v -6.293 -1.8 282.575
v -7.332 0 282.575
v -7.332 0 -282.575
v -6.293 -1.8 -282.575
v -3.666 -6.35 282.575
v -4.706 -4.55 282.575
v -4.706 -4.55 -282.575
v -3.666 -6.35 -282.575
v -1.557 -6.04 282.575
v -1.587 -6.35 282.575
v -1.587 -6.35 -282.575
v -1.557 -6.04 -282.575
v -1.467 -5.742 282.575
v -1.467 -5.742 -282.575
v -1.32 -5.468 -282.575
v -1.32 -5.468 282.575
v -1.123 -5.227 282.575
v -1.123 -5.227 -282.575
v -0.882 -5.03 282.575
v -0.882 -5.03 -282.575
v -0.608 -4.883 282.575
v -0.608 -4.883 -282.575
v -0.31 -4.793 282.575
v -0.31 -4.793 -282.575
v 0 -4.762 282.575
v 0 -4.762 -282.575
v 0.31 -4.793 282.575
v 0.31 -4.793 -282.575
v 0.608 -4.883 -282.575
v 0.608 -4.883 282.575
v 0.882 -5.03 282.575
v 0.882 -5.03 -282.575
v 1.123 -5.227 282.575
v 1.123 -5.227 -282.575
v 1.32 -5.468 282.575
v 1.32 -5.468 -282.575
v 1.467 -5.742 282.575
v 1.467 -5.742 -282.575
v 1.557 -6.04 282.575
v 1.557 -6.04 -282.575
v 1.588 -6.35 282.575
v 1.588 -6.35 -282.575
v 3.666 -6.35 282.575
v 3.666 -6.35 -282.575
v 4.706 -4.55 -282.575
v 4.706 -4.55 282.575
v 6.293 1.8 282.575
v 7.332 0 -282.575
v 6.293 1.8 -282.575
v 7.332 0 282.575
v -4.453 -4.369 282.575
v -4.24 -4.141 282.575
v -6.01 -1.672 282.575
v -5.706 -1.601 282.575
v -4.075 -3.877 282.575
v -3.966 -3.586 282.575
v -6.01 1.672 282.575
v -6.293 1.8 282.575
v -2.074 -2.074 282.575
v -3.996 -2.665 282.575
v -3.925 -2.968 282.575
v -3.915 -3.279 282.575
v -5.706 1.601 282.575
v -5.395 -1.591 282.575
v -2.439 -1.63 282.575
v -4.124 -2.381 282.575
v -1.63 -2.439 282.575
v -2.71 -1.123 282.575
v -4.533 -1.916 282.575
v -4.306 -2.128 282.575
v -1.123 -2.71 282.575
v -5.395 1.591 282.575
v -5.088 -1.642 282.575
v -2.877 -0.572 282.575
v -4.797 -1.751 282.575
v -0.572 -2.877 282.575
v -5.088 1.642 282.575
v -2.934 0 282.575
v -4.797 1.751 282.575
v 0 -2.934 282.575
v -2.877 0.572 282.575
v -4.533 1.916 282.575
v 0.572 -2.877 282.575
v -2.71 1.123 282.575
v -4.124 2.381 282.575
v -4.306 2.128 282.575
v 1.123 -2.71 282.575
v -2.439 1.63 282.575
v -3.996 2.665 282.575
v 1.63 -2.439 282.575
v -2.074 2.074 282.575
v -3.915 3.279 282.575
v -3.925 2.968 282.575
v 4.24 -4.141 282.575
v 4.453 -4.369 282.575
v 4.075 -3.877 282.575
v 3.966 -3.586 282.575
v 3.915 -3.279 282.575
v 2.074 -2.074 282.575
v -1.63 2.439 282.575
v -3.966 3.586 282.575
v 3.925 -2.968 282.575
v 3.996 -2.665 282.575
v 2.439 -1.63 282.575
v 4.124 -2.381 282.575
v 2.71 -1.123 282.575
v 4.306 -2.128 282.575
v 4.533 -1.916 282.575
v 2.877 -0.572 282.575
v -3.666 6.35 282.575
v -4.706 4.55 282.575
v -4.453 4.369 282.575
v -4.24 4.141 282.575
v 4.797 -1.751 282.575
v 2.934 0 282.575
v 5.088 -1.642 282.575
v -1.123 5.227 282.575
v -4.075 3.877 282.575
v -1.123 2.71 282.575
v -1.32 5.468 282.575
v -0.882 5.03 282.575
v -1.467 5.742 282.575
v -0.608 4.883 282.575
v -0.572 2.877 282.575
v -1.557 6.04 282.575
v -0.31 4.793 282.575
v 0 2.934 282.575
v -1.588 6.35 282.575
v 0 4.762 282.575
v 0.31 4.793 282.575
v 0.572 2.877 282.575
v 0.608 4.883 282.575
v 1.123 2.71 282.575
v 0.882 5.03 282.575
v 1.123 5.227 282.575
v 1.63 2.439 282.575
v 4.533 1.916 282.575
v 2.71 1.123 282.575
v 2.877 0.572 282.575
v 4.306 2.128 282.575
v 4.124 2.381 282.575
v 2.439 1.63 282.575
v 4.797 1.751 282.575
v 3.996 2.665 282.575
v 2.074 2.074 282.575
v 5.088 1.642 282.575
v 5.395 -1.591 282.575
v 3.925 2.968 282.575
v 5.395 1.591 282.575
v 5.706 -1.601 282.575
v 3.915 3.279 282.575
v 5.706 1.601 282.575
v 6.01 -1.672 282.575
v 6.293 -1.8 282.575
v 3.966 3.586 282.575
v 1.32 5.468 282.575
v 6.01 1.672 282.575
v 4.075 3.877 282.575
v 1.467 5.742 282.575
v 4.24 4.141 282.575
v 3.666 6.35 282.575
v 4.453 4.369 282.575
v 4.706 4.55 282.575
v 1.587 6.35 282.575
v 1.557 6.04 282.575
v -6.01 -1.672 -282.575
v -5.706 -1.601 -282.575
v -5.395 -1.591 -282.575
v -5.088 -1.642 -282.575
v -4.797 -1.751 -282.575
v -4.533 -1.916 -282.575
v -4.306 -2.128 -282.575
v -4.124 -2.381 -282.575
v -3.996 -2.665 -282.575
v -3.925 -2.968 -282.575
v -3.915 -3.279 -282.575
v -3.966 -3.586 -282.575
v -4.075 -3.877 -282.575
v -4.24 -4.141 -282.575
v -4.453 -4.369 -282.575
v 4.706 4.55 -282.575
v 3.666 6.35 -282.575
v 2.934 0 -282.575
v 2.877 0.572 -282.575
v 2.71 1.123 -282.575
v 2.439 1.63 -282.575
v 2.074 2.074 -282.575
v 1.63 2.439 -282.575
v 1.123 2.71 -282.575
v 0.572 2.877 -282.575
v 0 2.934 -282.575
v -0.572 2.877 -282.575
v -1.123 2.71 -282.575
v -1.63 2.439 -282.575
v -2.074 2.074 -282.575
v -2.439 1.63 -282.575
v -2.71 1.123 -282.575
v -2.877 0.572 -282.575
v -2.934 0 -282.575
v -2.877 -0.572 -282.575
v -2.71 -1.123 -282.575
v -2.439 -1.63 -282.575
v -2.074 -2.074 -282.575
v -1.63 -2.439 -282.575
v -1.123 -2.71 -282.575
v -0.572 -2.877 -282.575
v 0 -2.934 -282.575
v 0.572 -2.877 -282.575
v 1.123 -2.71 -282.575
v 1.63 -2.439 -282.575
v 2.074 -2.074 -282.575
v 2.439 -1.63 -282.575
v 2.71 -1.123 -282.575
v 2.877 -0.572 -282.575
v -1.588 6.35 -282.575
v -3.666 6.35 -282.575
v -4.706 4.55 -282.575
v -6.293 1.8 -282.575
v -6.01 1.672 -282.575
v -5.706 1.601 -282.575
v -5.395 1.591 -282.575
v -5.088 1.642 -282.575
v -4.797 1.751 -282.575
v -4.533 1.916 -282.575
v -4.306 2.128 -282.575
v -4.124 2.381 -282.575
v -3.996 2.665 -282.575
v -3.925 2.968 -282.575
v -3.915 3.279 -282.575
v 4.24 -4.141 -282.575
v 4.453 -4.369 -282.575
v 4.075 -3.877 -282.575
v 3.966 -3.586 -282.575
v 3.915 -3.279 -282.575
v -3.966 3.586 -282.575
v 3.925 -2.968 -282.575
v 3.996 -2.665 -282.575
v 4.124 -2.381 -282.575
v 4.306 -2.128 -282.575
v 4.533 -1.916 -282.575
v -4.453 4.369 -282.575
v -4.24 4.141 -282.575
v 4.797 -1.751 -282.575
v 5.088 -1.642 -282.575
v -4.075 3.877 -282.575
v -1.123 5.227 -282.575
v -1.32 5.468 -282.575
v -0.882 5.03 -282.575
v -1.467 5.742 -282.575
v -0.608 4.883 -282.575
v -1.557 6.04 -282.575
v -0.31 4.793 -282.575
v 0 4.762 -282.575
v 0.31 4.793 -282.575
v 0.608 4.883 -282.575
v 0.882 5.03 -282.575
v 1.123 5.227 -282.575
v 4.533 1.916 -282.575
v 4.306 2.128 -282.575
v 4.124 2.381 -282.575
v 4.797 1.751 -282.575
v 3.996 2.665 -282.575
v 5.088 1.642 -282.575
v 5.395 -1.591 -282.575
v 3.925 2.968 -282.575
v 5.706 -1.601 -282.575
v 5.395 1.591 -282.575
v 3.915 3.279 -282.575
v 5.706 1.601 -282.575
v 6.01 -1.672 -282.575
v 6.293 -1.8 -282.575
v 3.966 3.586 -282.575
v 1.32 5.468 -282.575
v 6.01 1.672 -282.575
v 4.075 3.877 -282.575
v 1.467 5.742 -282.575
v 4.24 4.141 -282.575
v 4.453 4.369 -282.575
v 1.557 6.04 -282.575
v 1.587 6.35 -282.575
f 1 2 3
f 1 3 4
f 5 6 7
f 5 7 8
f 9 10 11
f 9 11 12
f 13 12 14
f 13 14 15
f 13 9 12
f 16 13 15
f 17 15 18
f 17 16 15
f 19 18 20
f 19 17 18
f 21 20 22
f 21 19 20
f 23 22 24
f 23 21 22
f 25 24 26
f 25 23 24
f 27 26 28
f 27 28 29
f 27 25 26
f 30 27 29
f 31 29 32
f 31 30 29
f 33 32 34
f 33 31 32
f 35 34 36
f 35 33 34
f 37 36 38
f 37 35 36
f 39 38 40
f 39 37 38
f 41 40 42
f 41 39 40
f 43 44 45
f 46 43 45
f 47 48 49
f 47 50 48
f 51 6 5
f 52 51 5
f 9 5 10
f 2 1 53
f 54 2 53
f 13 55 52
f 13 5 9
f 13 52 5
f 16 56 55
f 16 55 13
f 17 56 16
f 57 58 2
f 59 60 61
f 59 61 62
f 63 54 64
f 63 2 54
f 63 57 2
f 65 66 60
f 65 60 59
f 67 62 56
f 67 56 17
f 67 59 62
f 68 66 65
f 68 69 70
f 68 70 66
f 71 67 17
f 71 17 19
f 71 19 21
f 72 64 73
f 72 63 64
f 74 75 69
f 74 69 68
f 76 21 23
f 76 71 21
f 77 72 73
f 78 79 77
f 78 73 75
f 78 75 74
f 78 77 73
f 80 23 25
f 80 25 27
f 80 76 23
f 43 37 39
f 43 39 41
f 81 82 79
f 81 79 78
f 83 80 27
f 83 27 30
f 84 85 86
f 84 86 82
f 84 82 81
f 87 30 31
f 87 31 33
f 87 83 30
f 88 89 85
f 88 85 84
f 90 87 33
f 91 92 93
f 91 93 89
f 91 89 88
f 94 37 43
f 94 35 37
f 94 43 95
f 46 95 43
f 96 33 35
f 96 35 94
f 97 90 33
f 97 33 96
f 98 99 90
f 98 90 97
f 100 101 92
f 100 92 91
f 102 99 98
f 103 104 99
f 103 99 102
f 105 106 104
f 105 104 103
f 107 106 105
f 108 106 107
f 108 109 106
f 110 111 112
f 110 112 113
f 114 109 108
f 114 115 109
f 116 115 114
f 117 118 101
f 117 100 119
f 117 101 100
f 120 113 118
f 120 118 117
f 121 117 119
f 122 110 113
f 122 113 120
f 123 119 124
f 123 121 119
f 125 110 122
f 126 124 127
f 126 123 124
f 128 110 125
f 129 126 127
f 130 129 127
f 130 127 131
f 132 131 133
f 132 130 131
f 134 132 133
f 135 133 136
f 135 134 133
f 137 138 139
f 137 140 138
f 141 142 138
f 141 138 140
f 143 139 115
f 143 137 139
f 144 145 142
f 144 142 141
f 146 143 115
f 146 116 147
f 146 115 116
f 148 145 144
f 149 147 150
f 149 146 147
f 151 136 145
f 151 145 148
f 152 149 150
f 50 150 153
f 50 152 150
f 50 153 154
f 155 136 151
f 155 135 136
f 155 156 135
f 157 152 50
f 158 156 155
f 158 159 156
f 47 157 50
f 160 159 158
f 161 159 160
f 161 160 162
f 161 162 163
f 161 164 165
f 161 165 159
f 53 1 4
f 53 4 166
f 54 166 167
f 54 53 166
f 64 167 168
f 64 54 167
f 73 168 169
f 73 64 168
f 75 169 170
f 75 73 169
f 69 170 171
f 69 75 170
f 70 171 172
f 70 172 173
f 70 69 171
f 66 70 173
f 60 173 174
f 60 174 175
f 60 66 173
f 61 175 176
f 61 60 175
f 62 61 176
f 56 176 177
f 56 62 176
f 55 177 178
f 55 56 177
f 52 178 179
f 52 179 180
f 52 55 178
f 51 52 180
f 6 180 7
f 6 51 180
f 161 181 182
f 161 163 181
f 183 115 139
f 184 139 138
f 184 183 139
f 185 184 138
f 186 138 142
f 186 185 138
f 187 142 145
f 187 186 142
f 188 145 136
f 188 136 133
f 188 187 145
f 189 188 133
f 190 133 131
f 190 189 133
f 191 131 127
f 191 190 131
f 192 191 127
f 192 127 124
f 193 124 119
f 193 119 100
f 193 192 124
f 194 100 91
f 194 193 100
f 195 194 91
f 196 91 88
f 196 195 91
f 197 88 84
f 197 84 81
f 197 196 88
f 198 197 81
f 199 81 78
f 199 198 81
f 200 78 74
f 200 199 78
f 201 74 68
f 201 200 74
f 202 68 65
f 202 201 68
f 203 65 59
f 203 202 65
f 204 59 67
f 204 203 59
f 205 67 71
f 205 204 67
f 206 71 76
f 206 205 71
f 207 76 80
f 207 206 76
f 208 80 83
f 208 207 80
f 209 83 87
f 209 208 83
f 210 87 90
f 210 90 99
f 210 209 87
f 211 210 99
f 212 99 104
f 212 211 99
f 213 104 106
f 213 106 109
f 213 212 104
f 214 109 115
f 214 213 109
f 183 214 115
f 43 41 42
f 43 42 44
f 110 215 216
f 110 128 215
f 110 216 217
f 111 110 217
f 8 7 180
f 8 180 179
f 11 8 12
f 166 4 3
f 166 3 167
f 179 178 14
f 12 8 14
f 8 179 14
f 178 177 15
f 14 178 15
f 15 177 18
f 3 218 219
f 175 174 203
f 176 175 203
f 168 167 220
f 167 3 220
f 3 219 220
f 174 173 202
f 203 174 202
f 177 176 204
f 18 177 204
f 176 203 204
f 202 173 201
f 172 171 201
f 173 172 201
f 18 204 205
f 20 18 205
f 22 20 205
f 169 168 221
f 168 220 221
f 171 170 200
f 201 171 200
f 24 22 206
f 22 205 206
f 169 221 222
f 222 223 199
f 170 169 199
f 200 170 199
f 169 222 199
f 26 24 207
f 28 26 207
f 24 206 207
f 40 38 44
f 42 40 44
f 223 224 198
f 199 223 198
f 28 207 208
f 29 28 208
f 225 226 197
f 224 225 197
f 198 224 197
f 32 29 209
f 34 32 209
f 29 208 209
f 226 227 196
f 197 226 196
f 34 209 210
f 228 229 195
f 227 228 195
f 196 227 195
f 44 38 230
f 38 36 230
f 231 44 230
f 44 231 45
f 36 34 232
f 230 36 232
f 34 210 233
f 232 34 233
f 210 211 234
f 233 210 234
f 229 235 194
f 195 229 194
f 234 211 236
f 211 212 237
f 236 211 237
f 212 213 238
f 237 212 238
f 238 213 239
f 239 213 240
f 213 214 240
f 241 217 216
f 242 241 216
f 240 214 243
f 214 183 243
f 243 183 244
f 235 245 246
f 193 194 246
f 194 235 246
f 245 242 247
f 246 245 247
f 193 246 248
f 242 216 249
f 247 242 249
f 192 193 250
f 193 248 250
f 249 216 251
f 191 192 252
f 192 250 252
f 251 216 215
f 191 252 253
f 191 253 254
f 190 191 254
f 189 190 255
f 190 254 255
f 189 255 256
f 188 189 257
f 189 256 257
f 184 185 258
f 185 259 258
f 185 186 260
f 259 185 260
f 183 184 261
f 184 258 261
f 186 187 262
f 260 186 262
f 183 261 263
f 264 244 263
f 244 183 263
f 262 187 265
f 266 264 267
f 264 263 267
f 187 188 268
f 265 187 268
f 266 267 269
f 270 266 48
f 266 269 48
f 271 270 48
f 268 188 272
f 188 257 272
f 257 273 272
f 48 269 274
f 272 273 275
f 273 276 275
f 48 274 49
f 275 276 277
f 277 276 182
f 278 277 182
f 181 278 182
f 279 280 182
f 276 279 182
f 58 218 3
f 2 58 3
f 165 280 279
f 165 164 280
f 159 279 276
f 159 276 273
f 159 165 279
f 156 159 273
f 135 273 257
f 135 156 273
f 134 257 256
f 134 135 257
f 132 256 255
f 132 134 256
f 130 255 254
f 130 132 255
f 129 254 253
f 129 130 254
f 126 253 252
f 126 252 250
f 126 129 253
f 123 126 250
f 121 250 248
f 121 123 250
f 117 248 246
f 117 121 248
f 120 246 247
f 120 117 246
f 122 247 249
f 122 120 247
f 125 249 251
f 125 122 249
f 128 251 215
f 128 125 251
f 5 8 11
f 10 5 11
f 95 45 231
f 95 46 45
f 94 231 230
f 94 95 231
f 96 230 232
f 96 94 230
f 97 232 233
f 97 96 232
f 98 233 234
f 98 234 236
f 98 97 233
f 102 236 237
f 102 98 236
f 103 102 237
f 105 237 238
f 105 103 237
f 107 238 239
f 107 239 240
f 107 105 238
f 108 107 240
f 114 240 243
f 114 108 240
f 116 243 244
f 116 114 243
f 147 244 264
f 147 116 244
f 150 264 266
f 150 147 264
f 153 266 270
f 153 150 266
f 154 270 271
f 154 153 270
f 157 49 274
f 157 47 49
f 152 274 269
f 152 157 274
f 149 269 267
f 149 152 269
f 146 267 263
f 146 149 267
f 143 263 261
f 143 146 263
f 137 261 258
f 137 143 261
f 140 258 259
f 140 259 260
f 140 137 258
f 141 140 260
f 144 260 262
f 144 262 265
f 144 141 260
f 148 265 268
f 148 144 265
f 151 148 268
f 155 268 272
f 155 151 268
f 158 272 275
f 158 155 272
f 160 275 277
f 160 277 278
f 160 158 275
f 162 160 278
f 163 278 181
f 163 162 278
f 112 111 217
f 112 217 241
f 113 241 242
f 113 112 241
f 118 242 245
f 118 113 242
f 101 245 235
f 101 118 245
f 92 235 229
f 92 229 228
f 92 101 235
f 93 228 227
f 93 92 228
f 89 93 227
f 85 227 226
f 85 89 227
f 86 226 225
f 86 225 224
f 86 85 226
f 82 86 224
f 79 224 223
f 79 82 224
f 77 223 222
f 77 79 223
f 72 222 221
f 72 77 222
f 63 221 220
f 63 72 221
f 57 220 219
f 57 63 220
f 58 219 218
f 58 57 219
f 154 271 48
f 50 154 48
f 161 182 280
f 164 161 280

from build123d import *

# Parameters (mm, degrees)
SKETCH1_R           = 2.9337
BOSS_EXTRUDE1_DEPTH = 282.575


with BuildPart() as part:
    # Sketch1 → Boss-Extrude1 (new, symmetric)
    with BuildSketch(Plane.XY):
        with BuildLine():
            Line((-1.587500385, 6.349999904), (-3.666174594, 6.349999778))
            Line((-3.666174594, 6.349999778), (-4.70551159, 4.549815043))
            ThreePointArc((-4.70551159, 4.549815043), (-4.12444613, 2.38124975), (-6.293011423, 1.80018429))
            Line((-6.293011423, 1.80018429), (-7.332348419, -4.44e-07))
            Line((-7.332348419, -4.44e-07), (-6.293011205, -1.800185053))
            ThreePointArc((-6.293011205, -1.800185053), (-4.124445841, -2.38125025), (-4.705511038, -4.549815614))
            Line((-4.705511038, -4.549815614), (-3.666173825, -6.350000222))
            Line((-3.666173825, -6.350000222), (-1.587499615, -6.350000096))
            ThreePointArc((-1.587499615, -6.350000096), (2.89e-07, -4.7625), (1.587500385, -6.349999904))
            Line((1.587500385, -6.349999904), (3.666174594, -6.349999778))
            Line((3.666174594, -6.349999778), (4.70551159, -4.549815043))
            ThreePointArc((4.70551159, -4.549815043), (4.12444613, -2.38124975), (6.293011423, -1.80018429))
            Line((6.293011423, -1.80018429), (7.332348419, 4.44e-07))
            Line((7.332348419, 4.44e-07), (6.293011205, 1.800185053))
            ThreePointArc((6.293011205, 1.800185053), (4.124445841, 2.38125025), (4.705511038, 4.549815614))
            Line((4.705511038, 4.549815614), (3.666173825, 6.350000222))
            Line((3.666173825, 6.350000222), (1.587499615, 6.350000096))
            ThreePointArc((1.587499615, 6.350000096), (-2.89e-07, 4.7625), (-1.587500385, 6.349999904))
        make_face()
        Circle(SKETCH1_R, mode=Mode.SUBTRACT)
    extrude(amount=BOSS_EXTRUDE1_DEPTH, both=True)


solid = part.part
